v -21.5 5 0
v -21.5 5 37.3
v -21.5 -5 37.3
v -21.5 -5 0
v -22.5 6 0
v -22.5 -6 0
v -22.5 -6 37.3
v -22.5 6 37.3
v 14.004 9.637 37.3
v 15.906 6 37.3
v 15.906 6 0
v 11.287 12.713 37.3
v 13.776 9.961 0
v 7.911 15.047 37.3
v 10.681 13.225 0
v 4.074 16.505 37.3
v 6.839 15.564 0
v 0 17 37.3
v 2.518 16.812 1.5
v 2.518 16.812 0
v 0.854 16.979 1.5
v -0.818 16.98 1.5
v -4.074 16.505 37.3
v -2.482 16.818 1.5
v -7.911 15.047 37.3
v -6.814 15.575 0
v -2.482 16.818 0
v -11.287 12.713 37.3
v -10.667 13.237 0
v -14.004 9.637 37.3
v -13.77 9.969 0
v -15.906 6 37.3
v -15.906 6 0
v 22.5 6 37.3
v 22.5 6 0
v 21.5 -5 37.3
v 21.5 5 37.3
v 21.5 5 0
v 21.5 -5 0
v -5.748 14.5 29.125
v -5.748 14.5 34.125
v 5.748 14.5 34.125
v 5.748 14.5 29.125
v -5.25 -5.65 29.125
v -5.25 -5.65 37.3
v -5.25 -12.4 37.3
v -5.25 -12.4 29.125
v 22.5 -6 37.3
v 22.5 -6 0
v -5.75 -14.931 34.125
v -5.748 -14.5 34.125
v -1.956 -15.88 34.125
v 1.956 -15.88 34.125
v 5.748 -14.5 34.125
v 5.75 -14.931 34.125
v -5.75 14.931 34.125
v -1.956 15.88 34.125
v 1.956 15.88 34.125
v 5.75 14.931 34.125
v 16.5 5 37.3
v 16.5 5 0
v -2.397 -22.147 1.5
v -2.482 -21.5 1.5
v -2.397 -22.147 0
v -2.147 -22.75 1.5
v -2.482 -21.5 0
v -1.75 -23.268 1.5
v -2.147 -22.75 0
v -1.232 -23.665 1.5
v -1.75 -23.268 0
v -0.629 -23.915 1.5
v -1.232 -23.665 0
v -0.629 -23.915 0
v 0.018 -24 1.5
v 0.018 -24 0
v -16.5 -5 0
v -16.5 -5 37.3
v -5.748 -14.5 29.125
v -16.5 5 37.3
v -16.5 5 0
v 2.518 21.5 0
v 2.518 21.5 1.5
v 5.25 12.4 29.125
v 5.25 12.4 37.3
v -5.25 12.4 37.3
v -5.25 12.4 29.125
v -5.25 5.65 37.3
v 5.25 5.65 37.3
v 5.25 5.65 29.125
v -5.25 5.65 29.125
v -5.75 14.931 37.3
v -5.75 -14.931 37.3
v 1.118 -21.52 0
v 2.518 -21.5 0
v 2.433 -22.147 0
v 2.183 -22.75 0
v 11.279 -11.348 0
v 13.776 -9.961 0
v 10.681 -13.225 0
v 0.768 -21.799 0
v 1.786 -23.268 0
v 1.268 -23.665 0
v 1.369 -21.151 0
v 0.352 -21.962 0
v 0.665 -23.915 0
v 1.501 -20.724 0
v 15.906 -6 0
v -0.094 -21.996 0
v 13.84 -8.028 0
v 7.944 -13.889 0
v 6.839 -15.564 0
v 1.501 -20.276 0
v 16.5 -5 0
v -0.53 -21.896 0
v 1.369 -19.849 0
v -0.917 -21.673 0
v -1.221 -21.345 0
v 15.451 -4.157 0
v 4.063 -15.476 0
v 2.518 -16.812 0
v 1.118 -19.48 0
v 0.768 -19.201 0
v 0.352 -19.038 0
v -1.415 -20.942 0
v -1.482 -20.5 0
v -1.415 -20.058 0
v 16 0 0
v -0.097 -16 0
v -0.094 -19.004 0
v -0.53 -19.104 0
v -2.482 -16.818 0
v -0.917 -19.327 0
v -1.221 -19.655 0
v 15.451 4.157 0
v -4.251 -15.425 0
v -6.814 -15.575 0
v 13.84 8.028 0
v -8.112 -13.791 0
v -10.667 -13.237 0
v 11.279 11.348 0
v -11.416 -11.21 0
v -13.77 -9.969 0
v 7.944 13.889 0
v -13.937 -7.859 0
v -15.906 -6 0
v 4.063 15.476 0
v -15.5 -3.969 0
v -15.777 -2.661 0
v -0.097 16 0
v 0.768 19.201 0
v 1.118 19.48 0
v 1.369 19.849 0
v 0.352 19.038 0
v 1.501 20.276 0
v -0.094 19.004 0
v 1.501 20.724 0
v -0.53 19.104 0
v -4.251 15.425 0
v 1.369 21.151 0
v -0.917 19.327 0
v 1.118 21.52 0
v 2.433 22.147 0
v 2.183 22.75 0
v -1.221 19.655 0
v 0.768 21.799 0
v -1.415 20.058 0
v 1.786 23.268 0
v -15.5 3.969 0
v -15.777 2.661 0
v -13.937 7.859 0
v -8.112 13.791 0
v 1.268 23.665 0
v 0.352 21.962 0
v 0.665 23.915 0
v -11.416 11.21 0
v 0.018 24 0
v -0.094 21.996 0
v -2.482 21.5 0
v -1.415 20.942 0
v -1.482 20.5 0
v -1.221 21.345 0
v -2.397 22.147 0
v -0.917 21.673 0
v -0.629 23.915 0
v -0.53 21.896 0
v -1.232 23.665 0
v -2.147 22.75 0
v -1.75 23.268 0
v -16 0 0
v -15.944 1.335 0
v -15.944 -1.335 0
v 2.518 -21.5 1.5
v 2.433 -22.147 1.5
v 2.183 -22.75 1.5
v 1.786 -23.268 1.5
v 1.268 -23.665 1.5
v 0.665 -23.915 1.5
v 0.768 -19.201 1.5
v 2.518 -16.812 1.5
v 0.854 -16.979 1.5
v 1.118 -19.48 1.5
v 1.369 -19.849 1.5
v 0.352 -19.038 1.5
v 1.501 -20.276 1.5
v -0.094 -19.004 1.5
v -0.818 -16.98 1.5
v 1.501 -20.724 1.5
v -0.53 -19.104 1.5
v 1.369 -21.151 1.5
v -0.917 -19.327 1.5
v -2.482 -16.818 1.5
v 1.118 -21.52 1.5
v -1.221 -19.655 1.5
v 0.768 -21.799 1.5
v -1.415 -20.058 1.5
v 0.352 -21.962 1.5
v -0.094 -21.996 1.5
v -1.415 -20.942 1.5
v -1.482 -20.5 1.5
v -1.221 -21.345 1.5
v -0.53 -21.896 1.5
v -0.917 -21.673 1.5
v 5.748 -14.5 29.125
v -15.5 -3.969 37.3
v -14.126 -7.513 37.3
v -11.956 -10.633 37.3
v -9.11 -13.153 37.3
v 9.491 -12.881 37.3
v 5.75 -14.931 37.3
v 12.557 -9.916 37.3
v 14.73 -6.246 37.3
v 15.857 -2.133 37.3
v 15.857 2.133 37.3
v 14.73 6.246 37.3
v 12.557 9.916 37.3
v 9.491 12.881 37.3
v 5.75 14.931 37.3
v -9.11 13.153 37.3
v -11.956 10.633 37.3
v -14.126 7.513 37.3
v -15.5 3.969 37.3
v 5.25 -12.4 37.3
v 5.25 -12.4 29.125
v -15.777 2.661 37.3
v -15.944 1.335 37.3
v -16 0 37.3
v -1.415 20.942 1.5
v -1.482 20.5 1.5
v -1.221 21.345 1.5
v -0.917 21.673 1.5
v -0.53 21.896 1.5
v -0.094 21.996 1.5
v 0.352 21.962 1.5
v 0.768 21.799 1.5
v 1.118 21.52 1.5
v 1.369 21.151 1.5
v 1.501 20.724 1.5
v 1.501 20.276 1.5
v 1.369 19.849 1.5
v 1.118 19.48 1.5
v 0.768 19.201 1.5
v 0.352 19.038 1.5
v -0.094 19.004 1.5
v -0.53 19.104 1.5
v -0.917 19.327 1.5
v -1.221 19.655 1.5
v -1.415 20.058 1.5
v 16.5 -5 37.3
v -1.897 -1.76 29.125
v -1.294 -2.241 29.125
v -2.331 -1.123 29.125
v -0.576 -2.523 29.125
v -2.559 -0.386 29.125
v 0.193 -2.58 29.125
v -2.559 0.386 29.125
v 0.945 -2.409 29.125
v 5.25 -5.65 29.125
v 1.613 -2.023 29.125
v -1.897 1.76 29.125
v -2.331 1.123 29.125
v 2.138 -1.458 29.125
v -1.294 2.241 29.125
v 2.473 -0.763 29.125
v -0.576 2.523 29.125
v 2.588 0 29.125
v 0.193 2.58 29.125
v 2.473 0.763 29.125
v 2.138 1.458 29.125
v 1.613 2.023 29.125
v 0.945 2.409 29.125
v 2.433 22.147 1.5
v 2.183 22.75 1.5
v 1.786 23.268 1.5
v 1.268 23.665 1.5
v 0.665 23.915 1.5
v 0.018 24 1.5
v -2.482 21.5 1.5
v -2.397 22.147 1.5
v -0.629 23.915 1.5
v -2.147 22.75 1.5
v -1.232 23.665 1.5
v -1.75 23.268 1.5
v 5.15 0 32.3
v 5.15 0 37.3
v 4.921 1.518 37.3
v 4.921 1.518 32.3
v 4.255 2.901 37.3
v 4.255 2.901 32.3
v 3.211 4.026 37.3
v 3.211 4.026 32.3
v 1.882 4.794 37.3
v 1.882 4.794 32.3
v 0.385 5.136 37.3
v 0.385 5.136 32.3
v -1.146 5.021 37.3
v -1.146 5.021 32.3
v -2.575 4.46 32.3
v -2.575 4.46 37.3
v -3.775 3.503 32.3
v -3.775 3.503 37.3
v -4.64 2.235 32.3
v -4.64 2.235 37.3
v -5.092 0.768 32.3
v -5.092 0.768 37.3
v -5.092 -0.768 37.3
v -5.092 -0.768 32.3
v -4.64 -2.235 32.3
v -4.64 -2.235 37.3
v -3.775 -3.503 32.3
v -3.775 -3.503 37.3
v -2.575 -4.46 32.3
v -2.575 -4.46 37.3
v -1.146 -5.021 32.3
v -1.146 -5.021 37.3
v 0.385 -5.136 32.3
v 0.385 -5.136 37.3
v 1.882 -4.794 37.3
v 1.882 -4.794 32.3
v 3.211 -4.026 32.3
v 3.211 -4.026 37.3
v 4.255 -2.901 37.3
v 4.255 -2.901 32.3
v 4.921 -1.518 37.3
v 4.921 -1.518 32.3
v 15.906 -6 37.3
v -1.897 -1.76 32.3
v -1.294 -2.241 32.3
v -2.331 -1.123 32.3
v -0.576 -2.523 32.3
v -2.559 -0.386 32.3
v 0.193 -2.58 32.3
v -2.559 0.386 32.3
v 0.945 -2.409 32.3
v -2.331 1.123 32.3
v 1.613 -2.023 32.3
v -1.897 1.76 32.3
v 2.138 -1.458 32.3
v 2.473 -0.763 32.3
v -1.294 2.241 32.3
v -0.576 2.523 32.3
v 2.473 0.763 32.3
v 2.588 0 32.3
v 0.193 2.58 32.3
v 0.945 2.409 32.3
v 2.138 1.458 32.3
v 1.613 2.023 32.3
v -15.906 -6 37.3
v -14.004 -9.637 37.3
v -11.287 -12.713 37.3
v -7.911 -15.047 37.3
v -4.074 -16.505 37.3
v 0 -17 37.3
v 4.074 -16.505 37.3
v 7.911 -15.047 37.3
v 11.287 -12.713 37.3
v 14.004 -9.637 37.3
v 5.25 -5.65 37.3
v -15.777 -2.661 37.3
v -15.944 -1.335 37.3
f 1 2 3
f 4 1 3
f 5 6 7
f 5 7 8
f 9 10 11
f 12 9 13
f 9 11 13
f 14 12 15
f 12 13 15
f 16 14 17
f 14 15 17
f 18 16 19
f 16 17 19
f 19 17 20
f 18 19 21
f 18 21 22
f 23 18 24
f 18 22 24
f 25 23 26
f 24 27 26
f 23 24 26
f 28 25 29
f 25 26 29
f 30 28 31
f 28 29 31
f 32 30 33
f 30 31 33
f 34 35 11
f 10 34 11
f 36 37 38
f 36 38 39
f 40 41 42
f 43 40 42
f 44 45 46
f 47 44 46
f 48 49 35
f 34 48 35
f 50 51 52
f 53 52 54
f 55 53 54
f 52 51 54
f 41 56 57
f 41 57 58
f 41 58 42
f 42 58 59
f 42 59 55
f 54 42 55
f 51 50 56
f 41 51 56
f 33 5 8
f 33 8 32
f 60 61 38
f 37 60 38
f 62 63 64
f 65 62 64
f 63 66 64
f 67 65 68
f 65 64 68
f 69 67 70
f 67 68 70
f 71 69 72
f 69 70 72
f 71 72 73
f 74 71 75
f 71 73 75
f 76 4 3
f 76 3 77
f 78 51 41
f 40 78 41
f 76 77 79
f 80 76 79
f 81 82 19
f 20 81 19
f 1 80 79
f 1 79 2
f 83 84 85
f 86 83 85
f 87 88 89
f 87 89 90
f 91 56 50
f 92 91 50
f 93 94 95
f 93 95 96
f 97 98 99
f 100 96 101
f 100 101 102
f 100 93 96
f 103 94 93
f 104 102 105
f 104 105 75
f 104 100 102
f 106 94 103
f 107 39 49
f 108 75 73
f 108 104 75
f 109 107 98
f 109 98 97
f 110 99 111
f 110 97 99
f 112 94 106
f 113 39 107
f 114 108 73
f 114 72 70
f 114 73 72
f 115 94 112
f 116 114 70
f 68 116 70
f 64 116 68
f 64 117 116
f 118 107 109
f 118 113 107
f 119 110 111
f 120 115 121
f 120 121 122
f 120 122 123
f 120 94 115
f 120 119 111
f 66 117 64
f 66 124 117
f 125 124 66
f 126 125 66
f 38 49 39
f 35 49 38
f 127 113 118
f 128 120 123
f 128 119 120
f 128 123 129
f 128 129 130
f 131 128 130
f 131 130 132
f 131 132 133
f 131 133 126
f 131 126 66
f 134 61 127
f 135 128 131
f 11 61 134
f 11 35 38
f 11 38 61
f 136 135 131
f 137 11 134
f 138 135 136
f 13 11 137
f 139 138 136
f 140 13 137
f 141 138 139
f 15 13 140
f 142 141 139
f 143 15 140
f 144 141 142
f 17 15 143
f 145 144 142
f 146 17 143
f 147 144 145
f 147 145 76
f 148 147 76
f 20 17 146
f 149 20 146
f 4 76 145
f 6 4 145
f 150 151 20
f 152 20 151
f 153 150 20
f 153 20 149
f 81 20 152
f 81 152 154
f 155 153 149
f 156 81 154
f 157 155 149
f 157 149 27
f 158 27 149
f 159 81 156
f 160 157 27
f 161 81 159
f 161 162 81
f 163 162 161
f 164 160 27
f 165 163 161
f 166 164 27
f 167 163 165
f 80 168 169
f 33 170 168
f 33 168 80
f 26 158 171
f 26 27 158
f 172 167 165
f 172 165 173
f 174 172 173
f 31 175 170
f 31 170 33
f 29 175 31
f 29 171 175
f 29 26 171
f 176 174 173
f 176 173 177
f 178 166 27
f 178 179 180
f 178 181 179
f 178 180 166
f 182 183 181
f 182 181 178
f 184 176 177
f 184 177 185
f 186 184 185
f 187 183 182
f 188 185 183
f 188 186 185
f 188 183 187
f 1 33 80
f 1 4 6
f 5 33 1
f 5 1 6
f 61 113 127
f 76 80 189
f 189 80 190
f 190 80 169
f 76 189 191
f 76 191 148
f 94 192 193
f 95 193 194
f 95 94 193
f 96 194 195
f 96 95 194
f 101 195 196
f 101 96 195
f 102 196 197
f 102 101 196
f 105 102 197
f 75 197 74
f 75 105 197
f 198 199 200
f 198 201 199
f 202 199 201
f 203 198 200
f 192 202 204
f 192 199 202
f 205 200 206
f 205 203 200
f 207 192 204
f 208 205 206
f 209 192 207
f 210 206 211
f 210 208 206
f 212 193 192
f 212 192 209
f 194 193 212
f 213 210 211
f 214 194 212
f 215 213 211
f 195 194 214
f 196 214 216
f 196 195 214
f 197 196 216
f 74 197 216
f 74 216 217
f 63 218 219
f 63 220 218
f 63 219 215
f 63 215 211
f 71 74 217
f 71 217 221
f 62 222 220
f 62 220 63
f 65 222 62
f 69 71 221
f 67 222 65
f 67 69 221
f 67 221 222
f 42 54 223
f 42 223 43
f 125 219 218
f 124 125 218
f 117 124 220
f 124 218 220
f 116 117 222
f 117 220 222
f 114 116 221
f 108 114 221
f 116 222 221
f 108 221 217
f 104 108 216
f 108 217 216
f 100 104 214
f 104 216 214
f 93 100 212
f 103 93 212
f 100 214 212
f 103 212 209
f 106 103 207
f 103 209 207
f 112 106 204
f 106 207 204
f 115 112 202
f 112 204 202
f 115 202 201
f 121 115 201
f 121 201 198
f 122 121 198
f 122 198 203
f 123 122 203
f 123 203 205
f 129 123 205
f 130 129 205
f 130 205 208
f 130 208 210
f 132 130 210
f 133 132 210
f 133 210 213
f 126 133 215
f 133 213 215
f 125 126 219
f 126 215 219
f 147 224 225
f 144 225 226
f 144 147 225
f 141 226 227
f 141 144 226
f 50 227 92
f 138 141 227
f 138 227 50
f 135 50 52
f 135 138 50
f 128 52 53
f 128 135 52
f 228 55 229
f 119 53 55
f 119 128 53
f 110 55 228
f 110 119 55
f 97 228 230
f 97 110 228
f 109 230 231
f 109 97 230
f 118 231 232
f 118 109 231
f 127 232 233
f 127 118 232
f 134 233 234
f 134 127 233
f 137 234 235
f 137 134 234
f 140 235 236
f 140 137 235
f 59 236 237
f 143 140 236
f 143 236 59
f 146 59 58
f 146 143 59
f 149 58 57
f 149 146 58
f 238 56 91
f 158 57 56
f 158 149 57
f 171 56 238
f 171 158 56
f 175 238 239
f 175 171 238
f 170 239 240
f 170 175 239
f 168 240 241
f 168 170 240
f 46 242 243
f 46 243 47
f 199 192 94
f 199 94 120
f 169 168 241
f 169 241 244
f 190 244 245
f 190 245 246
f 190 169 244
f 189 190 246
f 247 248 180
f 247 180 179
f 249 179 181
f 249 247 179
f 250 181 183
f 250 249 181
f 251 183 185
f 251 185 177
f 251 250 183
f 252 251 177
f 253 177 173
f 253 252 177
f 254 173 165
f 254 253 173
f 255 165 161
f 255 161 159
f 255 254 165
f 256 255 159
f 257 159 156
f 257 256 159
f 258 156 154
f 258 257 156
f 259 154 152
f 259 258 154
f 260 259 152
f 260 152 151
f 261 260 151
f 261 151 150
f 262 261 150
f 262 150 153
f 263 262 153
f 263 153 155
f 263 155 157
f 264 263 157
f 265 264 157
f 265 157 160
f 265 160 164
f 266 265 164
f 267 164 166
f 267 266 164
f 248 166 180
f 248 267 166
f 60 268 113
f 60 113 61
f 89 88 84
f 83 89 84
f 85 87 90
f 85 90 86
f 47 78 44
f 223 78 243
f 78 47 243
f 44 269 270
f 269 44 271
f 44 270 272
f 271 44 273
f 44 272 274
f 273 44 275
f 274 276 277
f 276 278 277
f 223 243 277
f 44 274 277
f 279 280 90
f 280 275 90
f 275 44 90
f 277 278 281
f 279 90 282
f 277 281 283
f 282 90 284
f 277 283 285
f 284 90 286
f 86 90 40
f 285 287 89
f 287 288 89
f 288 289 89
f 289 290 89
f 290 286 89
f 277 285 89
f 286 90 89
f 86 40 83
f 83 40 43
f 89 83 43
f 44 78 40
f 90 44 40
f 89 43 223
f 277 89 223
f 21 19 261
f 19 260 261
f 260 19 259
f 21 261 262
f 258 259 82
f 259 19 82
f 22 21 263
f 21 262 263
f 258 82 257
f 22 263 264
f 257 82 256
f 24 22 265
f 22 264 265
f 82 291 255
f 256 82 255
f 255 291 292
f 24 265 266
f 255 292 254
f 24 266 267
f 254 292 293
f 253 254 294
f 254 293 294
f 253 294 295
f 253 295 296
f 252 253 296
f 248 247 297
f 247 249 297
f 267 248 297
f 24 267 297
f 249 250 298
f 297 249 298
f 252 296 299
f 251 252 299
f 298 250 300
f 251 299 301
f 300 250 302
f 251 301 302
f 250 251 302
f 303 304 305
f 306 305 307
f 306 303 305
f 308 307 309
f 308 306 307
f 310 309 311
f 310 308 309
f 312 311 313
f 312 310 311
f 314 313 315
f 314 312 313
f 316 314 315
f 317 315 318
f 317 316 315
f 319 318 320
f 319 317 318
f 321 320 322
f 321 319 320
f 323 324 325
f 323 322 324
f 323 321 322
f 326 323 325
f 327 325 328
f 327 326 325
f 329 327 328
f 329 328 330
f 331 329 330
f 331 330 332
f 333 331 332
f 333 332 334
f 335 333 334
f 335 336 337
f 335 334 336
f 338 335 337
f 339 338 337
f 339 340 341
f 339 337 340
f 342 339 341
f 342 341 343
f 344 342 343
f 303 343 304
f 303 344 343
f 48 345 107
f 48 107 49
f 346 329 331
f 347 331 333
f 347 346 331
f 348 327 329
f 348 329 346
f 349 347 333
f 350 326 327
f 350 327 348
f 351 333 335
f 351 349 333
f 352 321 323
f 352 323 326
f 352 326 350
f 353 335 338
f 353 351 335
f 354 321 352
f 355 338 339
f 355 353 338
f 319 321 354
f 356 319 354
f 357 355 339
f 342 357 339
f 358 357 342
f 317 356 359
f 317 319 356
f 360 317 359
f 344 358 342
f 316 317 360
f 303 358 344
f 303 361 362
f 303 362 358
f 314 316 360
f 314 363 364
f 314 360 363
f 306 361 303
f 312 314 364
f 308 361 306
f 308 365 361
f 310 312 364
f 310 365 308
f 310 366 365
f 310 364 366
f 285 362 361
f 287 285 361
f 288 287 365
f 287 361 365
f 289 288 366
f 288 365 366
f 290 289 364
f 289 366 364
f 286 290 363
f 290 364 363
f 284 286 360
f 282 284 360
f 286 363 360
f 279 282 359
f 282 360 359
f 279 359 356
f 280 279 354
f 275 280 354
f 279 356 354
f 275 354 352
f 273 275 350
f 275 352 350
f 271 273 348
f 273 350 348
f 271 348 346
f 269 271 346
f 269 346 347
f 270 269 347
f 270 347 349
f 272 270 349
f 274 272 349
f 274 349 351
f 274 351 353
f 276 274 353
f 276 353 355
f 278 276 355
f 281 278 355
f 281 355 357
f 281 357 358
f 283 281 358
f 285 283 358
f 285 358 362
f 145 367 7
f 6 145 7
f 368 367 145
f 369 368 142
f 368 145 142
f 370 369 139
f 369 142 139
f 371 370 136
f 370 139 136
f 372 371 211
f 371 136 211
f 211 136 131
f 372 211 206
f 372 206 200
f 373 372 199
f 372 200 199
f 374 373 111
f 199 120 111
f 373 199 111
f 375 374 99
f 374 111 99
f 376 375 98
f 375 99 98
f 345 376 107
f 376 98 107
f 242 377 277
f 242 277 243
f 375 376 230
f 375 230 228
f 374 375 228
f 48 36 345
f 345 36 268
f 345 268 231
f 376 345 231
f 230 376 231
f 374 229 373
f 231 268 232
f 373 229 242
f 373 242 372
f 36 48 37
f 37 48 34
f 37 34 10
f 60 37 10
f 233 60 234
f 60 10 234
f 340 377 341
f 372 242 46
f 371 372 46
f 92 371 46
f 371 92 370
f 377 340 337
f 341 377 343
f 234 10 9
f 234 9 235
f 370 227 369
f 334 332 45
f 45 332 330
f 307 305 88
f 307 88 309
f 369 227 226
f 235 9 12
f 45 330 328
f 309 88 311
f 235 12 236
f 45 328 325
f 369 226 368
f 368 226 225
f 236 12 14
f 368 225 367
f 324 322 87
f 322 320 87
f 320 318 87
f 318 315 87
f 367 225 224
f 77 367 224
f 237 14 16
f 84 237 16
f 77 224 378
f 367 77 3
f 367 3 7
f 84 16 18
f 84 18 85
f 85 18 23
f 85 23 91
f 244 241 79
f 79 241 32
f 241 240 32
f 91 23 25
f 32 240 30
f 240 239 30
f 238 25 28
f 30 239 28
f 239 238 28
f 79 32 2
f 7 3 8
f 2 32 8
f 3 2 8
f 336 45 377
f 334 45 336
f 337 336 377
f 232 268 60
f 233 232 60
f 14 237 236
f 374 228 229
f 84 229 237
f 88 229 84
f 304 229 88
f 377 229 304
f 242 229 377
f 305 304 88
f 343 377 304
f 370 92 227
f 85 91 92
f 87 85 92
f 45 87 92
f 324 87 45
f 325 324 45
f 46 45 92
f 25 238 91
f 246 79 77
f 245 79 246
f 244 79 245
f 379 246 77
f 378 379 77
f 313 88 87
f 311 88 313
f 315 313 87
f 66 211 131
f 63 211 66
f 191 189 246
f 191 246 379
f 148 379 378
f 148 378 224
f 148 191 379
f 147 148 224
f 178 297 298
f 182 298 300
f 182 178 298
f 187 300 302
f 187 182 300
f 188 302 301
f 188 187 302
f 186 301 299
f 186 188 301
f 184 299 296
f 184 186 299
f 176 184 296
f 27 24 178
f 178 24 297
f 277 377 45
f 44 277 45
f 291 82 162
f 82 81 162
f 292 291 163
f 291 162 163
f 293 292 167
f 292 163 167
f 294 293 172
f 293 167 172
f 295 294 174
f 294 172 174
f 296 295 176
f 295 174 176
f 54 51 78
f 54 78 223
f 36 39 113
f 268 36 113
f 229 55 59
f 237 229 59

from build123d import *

# Parameters (mm, degrees)
SKETCH1_R               = 17
SKETCH1_R_2             = 16
BOSS_EXTRUDE1_DEPTH     = 37.3
BOSS_EXTRUDE3_START     = -3.175
SKETCH4_W               = 11.5
SKETCH4_H               = 11.5
BOSS_EXTRUDE3_DEPTH     = 3.175
SKETCH8_W               = 11.49524473
SKETCH8_H               = 29.000689646
SKETCH8_R               = 2.5875
BOSS_EXTRUDE4_DEPTH     = 5
CUT_EXTRUDE2_DEPTH      = 45.376683067
CUT_EXTRUDE2_DEPTH_BACK = 5
SKETCH7_R               = 5.15
SKETCH11_W              = 10.5
SKETCH11_H              = 6.75
CUT_EXTRUDE21_DEPTH     = 29
BOSS_EXTRUDE5_START     = -1.5
BOSS_EXTRUDE5_OUTLINE_R = 1.5
BOSS_EXTRUDE5_DEPTH     = 1.5
FILLET1_R               = 2.5
FILLET1_OF_MIRROR3_R    = 2.5
BOSS_EXTRUDE8_DEPTH     = 37.3
SKETCH15_8_W            = 5
SKETCH15_8_H            = 10
CUT_EXTRUDE22_DEPTH     = 37.3


# Read off the part's stored shape, not the designer's step: Boss-Extrude5
with BuildPart() as part:
    # Sketch1 → Boss-Extrude1 (new body)
    with BuildSketch(Plane.XY):
        with Locations(Location((0, 0, 0), (0, 0, 359.325928118))):
            Circle(SKETCH1_R)
        Circle(SKETCH1_R_2, mode=Mode.SUBTRACT)
    extrude(amount=BOSS_EXTRUDE1_DEPTH)

    # Sketch4 → Boss-Extrude3 (add)
    with BuildSketch(Plane.XY.offset(37.3).offset(BOSS_EXTRUDE3_START)):
        with BuildLine():
            ThreePointArc((-5.75, -14.931091722), (0, -16), (5.75, -14.931091722))
            Line((5.75, -14.931091722), (5.75, -5.75))
            Line((5.75, -5.75), (-5.75, -5.75))
            Line((-5.75, -5.75), (-5.75, -14.931091722))
        make_face()
        Rectangle(SKETCH4_W, SKETCH4_H)
        with BuildLine():
            ThreePointArc((5.75, 14.931091722), (0, 16), (-5.75, 14.931091722))
            Line((-5.75, 14.931091722), (-5.75, 5.75))
            Line((-5.75, 5.75), (5.75, 5.75))
            Line((5.75, 5.75), (5.75, 14.931091722))
        make_face()
    extrude(amount=BOSS_EXTRUDE3_DEPTH)

    # Sketch8 → Boss-Extrude4 (add)
    with BuildSketch(Plane.XY.offset(34.125)):
        Rectangle(SKETCH8_W, SKETCH8_H)
        Circle(SKETCH8_R, mode=Mode.SUBTRACT)
    extrude(amount=-BOSS_EXTRUDE4_DEPTH)

    # Sketch7 → Cut-Extrude2 (cut, two sides: drawn at the far end of the back side and taken through both)
    with BuildSketch(Plane.XY.offset(37.3).offset(-CUT_EXTRUDE2_DEPTH_BACK)):
        Circle(SKETCH7_R)
    extrude(amount=CUT_EXTRUDE2_DEPTH + CUT_EXTRUDE2_DEPTH_BACK, mode=Mode.SUBTRACT)

    # Sketch11 → Cut-Extrude21 (cut)
    with BuildSketch(Plane(origin=(0, 0, 37.3), x_dir=(-1, 0, 0), z_dir=(0, 0, -1))):
        with Locations((0, 9.025)):
            Rectangle(SKETCH11_W, SKETCH11_H)
    cut_extrude21 = extrude(amount=CUT_EXTRUDE21_DEPTH, mode=Mode.SUBTRACT)

    # Mirror1: Cut-Extrude21 across plane
    add(cut_extrude21.mirror(Plane.ZX), mode=Mode.SUBTRACT)

    # Boss-Extrude5 outline → Boss-Extrude5 (add)
    with BuildSketch(Plane(origin=(0, 0, 0), x_dir=(-1, 0, 0), z_dir=(0, 0, -1)).offset(BOSS_EXTRUDE5_START)):
        with BuildLine():
            ThreePointArc((-2.517959329, 16.812491809), (-0.018156734, 16.999990304), (2.482040671, 16.817832028))
            Line((2.482040671, 16.817832028), (2.482040671, 24))
            Line((2.482040671, 24), (-2.517959329, 24))
            Line((-2.517959329, 24), (-2.517959329, 16.812491809))
        make_face()
        with Locations((-0.017959329, 20.5)):
            Circle(BOSS_EXTRUDE5_OUTLINE_R, mode=Mode.SUBTRACT)
    boss_extrude5 = extrude(amount=BOSS_EXTRUDE5_DEPTH)

    # Fillet1
    fillet1_edges = [part.edges().sort_by_distance(p)[0] for p in [
        (2.517959329, 24, 0.75),
        (-2.482040671, 24, 0.75),
    ]]
    fillet(fillet1_edges, radius=FILLET1_R - 0.0001)  # a hair under: the kernel refuses the full size

    # Mirror3: Boss-Extrude5 across plane
    add(boss_extrude5.mirror(Plane.ZX))

    # Fillet1 of Mirror3
    fillet1_of_mirror3_edges = [part.edges().sort_by_distance(p)[0] for p in [
        (2.517959329, -24, 0.75),
        (-2.482040671, -24, 0.75),
    ]]
    fillet(fillet1_of_mirror3_edges, radius=FILLET1_OF_MIRROR3_R - 0.0001)  # a hair under: the kernel refuses the full size

    # Sketch15 → Boss-Extrude8 (add)
    with BuildSketch(Plane.XY):
        with BuildLine():
            Line((16.5, 5), (19, 5))
            Line((19, 5), (19, 6))
            Line((19, 6), (15.5, 6))
            Line((15.5, 6), (15.5, 3.968626967))
            ThreePointArc((15.5, 3.968626967), (15.874507866, 2), (16, 0))
            Line((16, 0), (16.5, 0))
            Line((16.5, 0), (16.5, 5))
        make_face()
        Polygon((21.5, 5), (21.5, 0), (22.5, 0), (22.5, 6), (19, 6), (19, 5), align=None)
        with BuildLine():
            Line((22.5, 0), (21.5, 0))
            Line((21.5, 0), (21.5, -5))
            Line((21.5, -5), (16.5, -5))
            Line((16.5, -5), (16.5, 0))
            Line((16.5, 0), (16, 0))
            ThreePointArc((16, 0), (15.874507866, -2), (15.5, -3.968626967))
            Line((15.5, -3.968626967), (15.5, -6))
            Line((15.5, -6), (22.5, -6))
            Line((22.5, -6), (22.5, 0))
        make_face()
    boss_extrude8 = extrude(amount=BOSS_EXTRUDE8_DEPTH)

    # Sketch15<8> → Cut-Extrude22 (cut)
    with BuildSketch(Plane.XY):
        with Locations((19, 0)):
            Rectangle(SKETCH15_8_W, SKETCH15_8_H)
    cut_extrude22 = extrude(amount=CUT_EXTRUDE22_DEPTH, mode=Mode.SUBTRACT)

    # Mirror4: Boss-Extrude8, Cut-Extrude22 across plane
    add(boss_extrude8.mirror(Plane(origin=(0, 0, 0), x_dir=(0, 0, 1), z_dir=(1, 0, 0))))
    add(cut_extrude22.mirror(Plane(origin=(0, 0, 0), x_dir=(0, 0, 1), z_dir=(1, 0, 0))), mode=Mode.SUBTRACT)


solid = part.part
